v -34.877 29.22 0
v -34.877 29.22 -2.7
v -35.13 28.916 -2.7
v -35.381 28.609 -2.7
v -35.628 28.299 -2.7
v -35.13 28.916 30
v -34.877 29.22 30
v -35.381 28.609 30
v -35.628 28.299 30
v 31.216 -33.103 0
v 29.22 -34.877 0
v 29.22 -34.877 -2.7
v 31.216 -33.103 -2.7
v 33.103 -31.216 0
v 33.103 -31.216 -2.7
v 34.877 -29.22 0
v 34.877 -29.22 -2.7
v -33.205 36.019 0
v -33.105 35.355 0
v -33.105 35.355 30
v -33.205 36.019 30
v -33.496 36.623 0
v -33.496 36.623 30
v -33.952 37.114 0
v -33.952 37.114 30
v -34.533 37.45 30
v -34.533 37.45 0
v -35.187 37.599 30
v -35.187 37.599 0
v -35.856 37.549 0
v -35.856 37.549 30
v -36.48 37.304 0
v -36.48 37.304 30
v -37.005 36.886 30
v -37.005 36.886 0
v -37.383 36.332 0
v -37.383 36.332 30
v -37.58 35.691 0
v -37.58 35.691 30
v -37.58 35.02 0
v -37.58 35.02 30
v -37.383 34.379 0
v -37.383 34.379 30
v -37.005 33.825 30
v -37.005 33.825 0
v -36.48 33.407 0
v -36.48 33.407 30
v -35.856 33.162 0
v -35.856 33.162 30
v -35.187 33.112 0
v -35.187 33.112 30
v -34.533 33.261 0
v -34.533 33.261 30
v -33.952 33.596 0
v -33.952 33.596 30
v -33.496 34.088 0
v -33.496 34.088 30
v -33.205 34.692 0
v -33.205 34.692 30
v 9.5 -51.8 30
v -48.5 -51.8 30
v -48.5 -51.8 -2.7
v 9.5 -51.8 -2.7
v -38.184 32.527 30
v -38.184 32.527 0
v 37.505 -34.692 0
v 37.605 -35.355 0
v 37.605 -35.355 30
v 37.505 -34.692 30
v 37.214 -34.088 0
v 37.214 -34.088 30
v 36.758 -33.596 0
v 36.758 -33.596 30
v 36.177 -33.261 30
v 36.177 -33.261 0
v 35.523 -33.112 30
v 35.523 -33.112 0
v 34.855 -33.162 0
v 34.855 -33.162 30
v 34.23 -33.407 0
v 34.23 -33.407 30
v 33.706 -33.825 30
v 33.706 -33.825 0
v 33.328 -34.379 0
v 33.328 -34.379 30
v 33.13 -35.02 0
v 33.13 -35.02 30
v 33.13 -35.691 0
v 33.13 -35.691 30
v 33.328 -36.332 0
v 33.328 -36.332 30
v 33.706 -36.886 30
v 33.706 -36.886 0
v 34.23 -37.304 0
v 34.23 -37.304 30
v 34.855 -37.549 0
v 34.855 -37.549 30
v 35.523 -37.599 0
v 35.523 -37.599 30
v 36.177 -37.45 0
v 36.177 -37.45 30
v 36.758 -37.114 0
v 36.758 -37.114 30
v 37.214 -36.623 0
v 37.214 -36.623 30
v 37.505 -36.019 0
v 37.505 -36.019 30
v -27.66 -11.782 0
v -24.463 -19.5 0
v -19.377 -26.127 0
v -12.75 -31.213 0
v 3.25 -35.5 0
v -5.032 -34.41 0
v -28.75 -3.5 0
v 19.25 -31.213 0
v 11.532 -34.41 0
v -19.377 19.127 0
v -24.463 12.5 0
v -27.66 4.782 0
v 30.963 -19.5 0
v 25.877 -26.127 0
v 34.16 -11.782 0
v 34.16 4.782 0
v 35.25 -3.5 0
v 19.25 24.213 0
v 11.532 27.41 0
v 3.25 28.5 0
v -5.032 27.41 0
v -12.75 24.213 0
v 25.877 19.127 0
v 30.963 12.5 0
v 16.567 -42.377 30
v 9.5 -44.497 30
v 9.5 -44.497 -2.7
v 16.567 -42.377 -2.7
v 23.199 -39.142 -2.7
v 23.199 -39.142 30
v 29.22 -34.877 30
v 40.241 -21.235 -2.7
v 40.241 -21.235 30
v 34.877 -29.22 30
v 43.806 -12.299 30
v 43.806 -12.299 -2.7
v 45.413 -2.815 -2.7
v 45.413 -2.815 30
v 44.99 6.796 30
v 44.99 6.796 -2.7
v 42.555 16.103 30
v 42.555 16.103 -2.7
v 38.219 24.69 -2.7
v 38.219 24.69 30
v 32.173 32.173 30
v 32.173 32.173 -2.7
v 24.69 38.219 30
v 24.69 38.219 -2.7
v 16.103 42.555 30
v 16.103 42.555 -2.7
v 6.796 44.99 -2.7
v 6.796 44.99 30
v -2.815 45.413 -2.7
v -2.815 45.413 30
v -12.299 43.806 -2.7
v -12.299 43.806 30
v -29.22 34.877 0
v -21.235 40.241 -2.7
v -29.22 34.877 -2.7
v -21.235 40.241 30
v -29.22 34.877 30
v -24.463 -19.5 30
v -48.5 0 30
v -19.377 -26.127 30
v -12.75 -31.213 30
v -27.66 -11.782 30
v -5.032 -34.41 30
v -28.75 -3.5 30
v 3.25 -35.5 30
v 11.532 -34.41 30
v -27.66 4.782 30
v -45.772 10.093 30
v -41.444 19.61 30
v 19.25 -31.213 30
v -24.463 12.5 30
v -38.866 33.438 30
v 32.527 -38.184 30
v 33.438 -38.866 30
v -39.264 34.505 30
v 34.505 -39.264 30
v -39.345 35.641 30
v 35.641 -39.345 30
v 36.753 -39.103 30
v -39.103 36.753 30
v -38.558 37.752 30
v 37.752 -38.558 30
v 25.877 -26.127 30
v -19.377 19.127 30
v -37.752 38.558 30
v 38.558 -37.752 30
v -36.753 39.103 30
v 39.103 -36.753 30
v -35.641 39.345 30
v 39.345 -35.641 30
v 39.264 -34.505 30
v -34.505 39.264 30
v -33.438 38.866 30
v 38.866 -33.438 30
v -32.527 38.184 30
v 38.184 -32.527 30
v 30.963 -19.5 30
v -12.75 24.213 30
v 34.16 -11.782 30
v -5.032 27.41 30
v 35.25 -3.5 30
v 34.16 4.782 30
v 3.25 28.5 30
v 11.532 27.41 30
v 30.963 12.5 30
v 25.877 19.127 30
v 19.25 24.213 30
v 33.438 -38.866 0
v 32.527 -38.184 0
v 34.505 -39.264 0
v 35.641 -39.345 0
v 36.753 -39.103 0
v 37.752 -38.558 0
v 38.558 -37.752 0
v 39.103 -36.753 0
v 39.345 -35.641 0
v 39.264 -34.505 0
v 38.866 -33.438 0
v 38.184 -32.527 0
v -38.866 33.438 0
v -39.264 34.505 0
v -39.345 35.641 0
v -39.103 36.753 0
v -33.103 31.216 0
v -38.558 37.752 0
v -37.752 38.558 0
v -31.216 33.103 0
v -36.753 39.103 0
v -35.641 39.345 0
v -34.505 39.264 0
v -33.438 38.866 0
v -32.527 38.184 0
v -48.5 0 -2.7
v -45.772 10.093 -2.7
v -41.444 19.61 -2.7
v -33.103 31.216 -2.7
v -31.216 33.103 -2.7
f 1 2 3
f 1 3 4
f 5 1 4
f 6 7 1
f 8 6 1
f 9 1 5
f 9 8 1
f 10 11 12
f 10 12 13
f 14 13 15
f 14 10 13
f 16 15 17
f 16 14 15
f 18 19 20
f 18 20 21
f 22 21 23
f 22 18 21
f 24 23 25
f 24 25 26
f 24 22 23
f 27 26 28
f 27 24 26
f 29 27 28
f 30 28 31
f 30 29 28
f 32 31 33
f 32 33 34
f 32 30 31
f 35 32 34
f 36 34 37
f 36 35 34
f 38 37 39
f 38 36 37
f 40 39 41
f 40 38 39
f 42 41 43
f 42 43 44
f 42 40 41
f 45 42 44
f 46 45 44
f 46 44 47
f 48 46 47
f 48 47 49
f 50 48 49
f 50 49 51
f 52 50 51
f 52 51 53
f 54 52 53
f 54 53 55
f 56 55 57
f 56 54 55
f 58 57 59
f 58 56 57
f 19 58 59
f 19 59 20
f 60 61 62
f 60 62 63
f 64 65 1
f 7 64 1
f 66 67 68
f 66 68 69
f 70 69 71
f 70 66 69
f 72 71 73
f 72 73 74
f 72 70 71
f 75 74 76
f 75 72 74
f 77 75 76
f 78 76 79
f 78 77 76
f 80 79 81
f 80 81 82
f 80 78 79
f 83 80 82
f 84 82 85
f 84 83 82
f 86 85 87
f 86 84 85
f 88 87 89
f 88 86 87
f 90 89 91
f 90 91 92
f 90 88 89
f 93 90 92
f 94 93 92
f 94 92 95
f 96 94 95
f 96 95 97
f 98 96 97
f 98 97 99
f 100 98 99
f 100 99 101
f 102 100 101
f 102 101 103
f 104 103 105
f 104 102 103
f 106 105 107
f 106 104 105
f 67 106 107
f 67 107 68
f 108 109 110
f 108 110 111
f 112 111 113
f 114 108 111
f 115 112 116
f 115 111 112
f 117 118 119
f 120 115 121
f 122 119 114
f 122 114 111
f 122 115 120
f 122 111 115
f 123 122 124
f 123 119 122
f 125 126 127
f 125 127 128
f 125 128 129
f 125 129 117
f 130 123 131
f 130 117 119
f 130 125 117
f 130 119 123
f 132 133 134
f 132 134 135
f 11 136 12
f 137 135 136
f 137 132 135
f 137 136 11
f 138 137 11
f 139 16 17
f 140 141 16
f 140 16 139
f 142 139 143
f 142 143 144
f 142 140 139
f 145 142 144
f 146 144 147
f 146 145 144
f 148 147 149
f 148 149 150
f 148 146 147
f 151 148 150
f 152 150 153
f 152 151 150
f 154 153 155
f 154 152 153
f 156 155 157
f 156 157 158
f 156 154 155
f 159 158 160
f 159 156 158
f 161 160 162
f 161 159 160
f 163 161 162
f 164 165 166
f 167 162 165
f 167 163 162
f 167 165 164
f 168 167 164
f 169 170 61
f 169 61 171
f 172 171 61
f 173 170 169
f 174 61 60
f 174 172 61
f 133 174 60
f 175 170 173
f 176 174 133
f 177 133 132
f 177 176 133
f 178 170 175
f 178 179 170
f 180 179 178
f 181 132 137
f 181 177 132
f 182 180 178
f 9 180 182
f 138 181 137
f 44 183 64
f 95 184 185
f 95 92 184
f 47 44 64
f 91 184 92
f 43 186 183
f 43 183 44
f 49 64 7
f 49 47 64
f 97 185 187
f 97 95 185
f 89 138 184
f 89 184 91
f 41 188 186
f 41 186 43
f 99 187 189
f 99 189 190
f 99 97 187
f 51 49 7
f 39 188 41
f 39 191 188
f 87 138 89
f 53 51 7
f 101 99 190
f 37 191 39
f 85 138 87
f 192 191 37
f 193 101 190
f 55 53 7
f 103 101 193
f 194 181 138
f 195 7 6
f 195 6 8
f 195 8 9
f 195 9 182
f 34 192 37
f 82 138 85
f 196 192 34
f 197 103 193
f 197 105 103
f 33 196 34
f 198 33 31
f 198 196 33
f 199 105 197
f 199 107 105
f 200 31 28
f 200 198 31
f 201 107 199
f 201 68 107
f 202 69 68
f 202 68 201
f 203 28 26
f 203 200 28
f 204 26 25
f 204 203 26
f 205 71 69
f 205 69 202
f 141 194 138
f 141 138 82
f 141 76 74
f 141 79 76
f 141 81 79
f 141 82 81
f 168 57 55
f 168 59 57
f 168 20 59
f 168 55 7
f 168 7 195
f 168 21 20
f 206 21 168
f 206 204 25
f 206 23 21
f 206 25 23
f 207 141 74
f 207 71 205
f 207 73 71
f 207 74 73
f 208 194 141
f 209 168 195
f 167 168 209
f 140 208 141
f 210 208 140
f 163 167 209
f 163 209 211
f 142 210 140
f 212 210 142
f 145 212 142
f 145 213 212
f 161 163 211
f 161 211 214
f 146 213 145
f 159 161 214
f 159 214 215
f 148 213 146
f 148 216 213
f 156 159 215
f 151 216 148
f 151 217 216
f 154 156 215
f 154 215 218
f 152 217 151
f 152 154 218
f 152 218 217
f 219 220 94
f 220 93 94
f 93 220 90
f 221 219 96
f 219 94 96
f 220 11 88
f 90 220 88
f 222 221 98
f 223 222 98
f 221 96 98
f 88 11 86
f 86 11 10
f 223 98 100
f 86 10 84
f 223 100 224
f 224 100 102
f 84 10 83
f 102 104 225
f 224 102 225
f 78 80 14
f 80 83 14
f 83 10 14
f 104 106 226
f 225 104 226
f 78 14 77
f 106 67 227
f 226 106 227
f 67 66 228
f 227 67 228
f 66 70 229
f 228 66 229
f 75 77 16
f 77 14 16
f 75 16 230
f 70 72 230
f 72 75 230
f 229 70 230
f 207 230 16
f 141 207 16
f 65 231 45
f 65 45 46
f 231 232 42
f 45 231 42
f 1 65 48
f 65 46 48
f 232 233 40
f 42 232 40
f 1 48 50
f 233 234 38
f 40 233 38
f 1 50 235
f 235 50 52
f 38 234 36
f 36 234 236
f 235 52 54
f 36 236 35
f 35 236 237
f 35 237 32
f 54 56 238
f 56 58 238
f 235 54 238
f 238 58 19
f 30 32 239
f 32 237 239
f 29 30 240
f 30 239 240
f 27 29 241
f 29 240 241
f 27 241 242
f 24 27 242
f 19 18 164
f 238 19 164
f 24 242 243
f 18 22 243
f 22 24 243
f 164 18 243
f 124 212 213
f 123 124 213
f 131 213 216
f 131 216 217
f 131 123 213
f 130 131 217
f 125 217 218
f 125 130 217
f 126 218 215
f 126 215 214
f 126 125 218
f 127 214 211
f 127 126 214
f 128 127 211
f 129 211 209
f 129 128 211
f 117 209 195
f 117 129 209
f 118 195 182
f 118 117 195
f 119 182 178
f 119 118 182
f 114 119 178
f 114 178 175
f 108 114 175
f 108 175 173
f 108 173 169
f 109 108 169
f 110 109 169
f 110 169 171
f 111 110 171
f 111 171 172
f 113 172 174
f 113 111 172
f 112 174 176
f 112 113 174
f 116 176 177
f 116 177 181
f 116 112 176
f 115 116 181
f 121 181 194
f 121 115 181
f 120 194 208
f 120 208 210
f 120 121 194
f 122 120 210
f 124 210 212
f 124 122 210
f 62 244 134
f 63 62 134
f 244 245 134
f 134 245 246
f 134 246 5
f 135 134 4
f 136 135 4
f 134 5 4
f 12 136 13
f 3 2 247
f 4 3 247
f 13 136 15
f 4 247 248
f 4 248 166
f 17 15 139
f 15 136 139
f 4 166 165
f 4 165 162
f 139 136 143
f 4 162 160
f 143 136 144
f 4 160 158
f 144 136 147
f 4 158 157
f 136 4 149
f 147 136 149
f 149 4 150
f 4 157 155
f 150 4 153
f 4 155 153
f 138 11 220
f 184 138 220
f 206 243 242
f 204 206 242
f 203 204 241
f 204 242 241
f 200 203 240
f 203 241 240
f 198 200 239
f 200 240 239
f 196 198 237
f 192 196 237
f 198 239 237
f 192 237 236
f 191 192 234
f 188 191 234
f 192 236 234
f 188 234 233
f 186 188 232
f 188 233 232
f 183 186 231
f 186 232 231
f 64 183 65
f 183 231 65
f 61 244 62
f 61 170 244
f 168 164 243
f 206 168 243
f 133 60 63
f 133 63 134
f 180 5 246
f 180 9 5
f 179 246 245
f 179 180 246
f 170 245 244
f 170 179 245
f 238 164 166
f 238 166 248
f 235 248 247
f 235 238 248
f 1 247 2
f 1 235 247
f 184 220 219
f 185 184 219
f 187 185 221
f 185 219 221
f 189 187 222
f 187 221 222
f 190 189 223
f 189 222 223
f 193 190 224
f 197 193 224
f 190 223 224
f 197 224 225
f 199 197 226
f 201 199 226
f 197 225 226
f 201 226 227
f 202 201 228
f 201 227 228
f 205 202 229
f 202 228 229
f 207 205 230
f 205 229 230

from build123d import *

# Parameters (mm, degrees)
F0_R     = 32
F0_R_2   = 2.25
F1_DEPTH = 30
F2_DEPTH = 2.7


with BuildPart() as f1:
    # F0 (on Top) → F1 (new body)
    with BuildSketch(Plane.XY):
        with BuildLine():
            Line((-48.5, 0), (-48.5, -51.8))
            Line((-48.5, -51.8), (9.5, -51.8))
            Line((9.5, -51.8), (9.5, -44.4971909226))
            ThreePointArc((9.5, -44.4971909226), (19.9487496546, -40.8937328599), (29.2203638041, -34.8772180536))
            ThreePointArc((29.2203638041, -34.8772180536), (32.173358544, -32.173358544), (34.8772180536, -29.2203638041))
            ThreePointArc((34.8772180536, -29.2203638041), (32.173358544, 32.173358544), (-29.2203638041, 34.8772180536))
            ThreePointArc((-29.2203638041, 34.8772180536), (-32.173358544, 32.173358544), (-34.8772180536, 29.2203638041))
            ThreePointArc((-34.8772180536, 29.2203638041), (-35.2558555468, 28.7623825449), (-35.6284796081, 28.2994954162))
            ThreePointArc((-35.6284796081, 28.2994954162), (-43.8019044029, 14.9400934365), (-48.5, 0))
        make_face()
        with Locations((3.25, -3.5)):
            Circle(F0_R, mode=Mode.SUBTRACT)
        with BuildLine():
            ThreePointArc((34.8772180536, -29.2203638041), (32.173358544, -32.173358544), (29.2203638041, -34.8772180536))
            Line((29.2203638041, -34.8772180536), (32.5269119346, -38.1837661841))
            ThreePointArc((32.5269119346, -38.1837661841), (38.1837661841, -38.1837661841), (38.1837661841, -32.5269119346))
            Line((38.1837661841, -32.5269119346), (34.8772180536, -29.2203638041))
        make_face()
        with Locations((35.3553390593, -35.3553390593)):
            Circle(F0_R_2, mode=Mode.SUBTRACT)
        with BuildLine():
            Line((-38.1837661841, 32.5269119346), (-34.8772180536, 29.2203638041))
            ThreePointArc((-34.8772180536, 29.2203638041), (-32.173358544, 32.173358544), (-29.2203638041, 34.8772180536))
            Line((-29.2203638041, 34.8772180536), (-32.5269119346, 38.1837661841))
            ThreePointArc((-32.5269119346, 38.1837661841), (-38.1837661841, 38.1837661841), (-38.1837661841, 32.5269119346))
        make_face()
        with Locations((-35.3553390593, 35.3553390593)):
            Circle(F0_R_2, mode=Mode.SUBTRACT)
    extrude(amount=F1_DEPTH)

    # F0 (on Top) → F2 (join)
    with BuildSketch(Plane.XY):
        with BuildLine():
            Line((-48.5, 0), (-48.5, -51.8))
            Line((-48.5, -51.8), (9.5, -51.8))
            Line((9.5, -51.8), (9.5, -44.4971909226))
            ThreePointArc((9.5, -44.4971909226), (19.9487496546, -40.8937328599), (29.2203638041, -34.8772180536))
            ThreePointArc((29.2203638041, -34.8772180536), (32.173358544, -32.173358544), (34.8772180536, -29.2203638041))
            ThreePointArc((34.8772180536, -29.2203638041), (32.173358544, 32.173358544), (-29.2203638041, 34.8772180536))
            ThreePointArc((-29.2203638041, 34.8772180536), (-32.173358544, 32.173358544), (-34.8772180536, 29.2203638041))
            ThreePointArc((-34.8772180536, 29.2203638041), (-35.2558555468, 28.7623825449), (-35.6284796081, 28.2994954162))
            ThreePointArc((-35.6284796081, 28.2994954162), (-43.8019044029, 14.9400934365), (-48.5, 0))
        make_face()
        with Locations((3.25, -3.5)):
            Circle(F0_R, mode=Mode.SUBTRACT)
        with Locations((3.25, -3.5)):
            Circle(F0_R)
    extrude(amount=-F2_DEPTH)


solid = f1.part
